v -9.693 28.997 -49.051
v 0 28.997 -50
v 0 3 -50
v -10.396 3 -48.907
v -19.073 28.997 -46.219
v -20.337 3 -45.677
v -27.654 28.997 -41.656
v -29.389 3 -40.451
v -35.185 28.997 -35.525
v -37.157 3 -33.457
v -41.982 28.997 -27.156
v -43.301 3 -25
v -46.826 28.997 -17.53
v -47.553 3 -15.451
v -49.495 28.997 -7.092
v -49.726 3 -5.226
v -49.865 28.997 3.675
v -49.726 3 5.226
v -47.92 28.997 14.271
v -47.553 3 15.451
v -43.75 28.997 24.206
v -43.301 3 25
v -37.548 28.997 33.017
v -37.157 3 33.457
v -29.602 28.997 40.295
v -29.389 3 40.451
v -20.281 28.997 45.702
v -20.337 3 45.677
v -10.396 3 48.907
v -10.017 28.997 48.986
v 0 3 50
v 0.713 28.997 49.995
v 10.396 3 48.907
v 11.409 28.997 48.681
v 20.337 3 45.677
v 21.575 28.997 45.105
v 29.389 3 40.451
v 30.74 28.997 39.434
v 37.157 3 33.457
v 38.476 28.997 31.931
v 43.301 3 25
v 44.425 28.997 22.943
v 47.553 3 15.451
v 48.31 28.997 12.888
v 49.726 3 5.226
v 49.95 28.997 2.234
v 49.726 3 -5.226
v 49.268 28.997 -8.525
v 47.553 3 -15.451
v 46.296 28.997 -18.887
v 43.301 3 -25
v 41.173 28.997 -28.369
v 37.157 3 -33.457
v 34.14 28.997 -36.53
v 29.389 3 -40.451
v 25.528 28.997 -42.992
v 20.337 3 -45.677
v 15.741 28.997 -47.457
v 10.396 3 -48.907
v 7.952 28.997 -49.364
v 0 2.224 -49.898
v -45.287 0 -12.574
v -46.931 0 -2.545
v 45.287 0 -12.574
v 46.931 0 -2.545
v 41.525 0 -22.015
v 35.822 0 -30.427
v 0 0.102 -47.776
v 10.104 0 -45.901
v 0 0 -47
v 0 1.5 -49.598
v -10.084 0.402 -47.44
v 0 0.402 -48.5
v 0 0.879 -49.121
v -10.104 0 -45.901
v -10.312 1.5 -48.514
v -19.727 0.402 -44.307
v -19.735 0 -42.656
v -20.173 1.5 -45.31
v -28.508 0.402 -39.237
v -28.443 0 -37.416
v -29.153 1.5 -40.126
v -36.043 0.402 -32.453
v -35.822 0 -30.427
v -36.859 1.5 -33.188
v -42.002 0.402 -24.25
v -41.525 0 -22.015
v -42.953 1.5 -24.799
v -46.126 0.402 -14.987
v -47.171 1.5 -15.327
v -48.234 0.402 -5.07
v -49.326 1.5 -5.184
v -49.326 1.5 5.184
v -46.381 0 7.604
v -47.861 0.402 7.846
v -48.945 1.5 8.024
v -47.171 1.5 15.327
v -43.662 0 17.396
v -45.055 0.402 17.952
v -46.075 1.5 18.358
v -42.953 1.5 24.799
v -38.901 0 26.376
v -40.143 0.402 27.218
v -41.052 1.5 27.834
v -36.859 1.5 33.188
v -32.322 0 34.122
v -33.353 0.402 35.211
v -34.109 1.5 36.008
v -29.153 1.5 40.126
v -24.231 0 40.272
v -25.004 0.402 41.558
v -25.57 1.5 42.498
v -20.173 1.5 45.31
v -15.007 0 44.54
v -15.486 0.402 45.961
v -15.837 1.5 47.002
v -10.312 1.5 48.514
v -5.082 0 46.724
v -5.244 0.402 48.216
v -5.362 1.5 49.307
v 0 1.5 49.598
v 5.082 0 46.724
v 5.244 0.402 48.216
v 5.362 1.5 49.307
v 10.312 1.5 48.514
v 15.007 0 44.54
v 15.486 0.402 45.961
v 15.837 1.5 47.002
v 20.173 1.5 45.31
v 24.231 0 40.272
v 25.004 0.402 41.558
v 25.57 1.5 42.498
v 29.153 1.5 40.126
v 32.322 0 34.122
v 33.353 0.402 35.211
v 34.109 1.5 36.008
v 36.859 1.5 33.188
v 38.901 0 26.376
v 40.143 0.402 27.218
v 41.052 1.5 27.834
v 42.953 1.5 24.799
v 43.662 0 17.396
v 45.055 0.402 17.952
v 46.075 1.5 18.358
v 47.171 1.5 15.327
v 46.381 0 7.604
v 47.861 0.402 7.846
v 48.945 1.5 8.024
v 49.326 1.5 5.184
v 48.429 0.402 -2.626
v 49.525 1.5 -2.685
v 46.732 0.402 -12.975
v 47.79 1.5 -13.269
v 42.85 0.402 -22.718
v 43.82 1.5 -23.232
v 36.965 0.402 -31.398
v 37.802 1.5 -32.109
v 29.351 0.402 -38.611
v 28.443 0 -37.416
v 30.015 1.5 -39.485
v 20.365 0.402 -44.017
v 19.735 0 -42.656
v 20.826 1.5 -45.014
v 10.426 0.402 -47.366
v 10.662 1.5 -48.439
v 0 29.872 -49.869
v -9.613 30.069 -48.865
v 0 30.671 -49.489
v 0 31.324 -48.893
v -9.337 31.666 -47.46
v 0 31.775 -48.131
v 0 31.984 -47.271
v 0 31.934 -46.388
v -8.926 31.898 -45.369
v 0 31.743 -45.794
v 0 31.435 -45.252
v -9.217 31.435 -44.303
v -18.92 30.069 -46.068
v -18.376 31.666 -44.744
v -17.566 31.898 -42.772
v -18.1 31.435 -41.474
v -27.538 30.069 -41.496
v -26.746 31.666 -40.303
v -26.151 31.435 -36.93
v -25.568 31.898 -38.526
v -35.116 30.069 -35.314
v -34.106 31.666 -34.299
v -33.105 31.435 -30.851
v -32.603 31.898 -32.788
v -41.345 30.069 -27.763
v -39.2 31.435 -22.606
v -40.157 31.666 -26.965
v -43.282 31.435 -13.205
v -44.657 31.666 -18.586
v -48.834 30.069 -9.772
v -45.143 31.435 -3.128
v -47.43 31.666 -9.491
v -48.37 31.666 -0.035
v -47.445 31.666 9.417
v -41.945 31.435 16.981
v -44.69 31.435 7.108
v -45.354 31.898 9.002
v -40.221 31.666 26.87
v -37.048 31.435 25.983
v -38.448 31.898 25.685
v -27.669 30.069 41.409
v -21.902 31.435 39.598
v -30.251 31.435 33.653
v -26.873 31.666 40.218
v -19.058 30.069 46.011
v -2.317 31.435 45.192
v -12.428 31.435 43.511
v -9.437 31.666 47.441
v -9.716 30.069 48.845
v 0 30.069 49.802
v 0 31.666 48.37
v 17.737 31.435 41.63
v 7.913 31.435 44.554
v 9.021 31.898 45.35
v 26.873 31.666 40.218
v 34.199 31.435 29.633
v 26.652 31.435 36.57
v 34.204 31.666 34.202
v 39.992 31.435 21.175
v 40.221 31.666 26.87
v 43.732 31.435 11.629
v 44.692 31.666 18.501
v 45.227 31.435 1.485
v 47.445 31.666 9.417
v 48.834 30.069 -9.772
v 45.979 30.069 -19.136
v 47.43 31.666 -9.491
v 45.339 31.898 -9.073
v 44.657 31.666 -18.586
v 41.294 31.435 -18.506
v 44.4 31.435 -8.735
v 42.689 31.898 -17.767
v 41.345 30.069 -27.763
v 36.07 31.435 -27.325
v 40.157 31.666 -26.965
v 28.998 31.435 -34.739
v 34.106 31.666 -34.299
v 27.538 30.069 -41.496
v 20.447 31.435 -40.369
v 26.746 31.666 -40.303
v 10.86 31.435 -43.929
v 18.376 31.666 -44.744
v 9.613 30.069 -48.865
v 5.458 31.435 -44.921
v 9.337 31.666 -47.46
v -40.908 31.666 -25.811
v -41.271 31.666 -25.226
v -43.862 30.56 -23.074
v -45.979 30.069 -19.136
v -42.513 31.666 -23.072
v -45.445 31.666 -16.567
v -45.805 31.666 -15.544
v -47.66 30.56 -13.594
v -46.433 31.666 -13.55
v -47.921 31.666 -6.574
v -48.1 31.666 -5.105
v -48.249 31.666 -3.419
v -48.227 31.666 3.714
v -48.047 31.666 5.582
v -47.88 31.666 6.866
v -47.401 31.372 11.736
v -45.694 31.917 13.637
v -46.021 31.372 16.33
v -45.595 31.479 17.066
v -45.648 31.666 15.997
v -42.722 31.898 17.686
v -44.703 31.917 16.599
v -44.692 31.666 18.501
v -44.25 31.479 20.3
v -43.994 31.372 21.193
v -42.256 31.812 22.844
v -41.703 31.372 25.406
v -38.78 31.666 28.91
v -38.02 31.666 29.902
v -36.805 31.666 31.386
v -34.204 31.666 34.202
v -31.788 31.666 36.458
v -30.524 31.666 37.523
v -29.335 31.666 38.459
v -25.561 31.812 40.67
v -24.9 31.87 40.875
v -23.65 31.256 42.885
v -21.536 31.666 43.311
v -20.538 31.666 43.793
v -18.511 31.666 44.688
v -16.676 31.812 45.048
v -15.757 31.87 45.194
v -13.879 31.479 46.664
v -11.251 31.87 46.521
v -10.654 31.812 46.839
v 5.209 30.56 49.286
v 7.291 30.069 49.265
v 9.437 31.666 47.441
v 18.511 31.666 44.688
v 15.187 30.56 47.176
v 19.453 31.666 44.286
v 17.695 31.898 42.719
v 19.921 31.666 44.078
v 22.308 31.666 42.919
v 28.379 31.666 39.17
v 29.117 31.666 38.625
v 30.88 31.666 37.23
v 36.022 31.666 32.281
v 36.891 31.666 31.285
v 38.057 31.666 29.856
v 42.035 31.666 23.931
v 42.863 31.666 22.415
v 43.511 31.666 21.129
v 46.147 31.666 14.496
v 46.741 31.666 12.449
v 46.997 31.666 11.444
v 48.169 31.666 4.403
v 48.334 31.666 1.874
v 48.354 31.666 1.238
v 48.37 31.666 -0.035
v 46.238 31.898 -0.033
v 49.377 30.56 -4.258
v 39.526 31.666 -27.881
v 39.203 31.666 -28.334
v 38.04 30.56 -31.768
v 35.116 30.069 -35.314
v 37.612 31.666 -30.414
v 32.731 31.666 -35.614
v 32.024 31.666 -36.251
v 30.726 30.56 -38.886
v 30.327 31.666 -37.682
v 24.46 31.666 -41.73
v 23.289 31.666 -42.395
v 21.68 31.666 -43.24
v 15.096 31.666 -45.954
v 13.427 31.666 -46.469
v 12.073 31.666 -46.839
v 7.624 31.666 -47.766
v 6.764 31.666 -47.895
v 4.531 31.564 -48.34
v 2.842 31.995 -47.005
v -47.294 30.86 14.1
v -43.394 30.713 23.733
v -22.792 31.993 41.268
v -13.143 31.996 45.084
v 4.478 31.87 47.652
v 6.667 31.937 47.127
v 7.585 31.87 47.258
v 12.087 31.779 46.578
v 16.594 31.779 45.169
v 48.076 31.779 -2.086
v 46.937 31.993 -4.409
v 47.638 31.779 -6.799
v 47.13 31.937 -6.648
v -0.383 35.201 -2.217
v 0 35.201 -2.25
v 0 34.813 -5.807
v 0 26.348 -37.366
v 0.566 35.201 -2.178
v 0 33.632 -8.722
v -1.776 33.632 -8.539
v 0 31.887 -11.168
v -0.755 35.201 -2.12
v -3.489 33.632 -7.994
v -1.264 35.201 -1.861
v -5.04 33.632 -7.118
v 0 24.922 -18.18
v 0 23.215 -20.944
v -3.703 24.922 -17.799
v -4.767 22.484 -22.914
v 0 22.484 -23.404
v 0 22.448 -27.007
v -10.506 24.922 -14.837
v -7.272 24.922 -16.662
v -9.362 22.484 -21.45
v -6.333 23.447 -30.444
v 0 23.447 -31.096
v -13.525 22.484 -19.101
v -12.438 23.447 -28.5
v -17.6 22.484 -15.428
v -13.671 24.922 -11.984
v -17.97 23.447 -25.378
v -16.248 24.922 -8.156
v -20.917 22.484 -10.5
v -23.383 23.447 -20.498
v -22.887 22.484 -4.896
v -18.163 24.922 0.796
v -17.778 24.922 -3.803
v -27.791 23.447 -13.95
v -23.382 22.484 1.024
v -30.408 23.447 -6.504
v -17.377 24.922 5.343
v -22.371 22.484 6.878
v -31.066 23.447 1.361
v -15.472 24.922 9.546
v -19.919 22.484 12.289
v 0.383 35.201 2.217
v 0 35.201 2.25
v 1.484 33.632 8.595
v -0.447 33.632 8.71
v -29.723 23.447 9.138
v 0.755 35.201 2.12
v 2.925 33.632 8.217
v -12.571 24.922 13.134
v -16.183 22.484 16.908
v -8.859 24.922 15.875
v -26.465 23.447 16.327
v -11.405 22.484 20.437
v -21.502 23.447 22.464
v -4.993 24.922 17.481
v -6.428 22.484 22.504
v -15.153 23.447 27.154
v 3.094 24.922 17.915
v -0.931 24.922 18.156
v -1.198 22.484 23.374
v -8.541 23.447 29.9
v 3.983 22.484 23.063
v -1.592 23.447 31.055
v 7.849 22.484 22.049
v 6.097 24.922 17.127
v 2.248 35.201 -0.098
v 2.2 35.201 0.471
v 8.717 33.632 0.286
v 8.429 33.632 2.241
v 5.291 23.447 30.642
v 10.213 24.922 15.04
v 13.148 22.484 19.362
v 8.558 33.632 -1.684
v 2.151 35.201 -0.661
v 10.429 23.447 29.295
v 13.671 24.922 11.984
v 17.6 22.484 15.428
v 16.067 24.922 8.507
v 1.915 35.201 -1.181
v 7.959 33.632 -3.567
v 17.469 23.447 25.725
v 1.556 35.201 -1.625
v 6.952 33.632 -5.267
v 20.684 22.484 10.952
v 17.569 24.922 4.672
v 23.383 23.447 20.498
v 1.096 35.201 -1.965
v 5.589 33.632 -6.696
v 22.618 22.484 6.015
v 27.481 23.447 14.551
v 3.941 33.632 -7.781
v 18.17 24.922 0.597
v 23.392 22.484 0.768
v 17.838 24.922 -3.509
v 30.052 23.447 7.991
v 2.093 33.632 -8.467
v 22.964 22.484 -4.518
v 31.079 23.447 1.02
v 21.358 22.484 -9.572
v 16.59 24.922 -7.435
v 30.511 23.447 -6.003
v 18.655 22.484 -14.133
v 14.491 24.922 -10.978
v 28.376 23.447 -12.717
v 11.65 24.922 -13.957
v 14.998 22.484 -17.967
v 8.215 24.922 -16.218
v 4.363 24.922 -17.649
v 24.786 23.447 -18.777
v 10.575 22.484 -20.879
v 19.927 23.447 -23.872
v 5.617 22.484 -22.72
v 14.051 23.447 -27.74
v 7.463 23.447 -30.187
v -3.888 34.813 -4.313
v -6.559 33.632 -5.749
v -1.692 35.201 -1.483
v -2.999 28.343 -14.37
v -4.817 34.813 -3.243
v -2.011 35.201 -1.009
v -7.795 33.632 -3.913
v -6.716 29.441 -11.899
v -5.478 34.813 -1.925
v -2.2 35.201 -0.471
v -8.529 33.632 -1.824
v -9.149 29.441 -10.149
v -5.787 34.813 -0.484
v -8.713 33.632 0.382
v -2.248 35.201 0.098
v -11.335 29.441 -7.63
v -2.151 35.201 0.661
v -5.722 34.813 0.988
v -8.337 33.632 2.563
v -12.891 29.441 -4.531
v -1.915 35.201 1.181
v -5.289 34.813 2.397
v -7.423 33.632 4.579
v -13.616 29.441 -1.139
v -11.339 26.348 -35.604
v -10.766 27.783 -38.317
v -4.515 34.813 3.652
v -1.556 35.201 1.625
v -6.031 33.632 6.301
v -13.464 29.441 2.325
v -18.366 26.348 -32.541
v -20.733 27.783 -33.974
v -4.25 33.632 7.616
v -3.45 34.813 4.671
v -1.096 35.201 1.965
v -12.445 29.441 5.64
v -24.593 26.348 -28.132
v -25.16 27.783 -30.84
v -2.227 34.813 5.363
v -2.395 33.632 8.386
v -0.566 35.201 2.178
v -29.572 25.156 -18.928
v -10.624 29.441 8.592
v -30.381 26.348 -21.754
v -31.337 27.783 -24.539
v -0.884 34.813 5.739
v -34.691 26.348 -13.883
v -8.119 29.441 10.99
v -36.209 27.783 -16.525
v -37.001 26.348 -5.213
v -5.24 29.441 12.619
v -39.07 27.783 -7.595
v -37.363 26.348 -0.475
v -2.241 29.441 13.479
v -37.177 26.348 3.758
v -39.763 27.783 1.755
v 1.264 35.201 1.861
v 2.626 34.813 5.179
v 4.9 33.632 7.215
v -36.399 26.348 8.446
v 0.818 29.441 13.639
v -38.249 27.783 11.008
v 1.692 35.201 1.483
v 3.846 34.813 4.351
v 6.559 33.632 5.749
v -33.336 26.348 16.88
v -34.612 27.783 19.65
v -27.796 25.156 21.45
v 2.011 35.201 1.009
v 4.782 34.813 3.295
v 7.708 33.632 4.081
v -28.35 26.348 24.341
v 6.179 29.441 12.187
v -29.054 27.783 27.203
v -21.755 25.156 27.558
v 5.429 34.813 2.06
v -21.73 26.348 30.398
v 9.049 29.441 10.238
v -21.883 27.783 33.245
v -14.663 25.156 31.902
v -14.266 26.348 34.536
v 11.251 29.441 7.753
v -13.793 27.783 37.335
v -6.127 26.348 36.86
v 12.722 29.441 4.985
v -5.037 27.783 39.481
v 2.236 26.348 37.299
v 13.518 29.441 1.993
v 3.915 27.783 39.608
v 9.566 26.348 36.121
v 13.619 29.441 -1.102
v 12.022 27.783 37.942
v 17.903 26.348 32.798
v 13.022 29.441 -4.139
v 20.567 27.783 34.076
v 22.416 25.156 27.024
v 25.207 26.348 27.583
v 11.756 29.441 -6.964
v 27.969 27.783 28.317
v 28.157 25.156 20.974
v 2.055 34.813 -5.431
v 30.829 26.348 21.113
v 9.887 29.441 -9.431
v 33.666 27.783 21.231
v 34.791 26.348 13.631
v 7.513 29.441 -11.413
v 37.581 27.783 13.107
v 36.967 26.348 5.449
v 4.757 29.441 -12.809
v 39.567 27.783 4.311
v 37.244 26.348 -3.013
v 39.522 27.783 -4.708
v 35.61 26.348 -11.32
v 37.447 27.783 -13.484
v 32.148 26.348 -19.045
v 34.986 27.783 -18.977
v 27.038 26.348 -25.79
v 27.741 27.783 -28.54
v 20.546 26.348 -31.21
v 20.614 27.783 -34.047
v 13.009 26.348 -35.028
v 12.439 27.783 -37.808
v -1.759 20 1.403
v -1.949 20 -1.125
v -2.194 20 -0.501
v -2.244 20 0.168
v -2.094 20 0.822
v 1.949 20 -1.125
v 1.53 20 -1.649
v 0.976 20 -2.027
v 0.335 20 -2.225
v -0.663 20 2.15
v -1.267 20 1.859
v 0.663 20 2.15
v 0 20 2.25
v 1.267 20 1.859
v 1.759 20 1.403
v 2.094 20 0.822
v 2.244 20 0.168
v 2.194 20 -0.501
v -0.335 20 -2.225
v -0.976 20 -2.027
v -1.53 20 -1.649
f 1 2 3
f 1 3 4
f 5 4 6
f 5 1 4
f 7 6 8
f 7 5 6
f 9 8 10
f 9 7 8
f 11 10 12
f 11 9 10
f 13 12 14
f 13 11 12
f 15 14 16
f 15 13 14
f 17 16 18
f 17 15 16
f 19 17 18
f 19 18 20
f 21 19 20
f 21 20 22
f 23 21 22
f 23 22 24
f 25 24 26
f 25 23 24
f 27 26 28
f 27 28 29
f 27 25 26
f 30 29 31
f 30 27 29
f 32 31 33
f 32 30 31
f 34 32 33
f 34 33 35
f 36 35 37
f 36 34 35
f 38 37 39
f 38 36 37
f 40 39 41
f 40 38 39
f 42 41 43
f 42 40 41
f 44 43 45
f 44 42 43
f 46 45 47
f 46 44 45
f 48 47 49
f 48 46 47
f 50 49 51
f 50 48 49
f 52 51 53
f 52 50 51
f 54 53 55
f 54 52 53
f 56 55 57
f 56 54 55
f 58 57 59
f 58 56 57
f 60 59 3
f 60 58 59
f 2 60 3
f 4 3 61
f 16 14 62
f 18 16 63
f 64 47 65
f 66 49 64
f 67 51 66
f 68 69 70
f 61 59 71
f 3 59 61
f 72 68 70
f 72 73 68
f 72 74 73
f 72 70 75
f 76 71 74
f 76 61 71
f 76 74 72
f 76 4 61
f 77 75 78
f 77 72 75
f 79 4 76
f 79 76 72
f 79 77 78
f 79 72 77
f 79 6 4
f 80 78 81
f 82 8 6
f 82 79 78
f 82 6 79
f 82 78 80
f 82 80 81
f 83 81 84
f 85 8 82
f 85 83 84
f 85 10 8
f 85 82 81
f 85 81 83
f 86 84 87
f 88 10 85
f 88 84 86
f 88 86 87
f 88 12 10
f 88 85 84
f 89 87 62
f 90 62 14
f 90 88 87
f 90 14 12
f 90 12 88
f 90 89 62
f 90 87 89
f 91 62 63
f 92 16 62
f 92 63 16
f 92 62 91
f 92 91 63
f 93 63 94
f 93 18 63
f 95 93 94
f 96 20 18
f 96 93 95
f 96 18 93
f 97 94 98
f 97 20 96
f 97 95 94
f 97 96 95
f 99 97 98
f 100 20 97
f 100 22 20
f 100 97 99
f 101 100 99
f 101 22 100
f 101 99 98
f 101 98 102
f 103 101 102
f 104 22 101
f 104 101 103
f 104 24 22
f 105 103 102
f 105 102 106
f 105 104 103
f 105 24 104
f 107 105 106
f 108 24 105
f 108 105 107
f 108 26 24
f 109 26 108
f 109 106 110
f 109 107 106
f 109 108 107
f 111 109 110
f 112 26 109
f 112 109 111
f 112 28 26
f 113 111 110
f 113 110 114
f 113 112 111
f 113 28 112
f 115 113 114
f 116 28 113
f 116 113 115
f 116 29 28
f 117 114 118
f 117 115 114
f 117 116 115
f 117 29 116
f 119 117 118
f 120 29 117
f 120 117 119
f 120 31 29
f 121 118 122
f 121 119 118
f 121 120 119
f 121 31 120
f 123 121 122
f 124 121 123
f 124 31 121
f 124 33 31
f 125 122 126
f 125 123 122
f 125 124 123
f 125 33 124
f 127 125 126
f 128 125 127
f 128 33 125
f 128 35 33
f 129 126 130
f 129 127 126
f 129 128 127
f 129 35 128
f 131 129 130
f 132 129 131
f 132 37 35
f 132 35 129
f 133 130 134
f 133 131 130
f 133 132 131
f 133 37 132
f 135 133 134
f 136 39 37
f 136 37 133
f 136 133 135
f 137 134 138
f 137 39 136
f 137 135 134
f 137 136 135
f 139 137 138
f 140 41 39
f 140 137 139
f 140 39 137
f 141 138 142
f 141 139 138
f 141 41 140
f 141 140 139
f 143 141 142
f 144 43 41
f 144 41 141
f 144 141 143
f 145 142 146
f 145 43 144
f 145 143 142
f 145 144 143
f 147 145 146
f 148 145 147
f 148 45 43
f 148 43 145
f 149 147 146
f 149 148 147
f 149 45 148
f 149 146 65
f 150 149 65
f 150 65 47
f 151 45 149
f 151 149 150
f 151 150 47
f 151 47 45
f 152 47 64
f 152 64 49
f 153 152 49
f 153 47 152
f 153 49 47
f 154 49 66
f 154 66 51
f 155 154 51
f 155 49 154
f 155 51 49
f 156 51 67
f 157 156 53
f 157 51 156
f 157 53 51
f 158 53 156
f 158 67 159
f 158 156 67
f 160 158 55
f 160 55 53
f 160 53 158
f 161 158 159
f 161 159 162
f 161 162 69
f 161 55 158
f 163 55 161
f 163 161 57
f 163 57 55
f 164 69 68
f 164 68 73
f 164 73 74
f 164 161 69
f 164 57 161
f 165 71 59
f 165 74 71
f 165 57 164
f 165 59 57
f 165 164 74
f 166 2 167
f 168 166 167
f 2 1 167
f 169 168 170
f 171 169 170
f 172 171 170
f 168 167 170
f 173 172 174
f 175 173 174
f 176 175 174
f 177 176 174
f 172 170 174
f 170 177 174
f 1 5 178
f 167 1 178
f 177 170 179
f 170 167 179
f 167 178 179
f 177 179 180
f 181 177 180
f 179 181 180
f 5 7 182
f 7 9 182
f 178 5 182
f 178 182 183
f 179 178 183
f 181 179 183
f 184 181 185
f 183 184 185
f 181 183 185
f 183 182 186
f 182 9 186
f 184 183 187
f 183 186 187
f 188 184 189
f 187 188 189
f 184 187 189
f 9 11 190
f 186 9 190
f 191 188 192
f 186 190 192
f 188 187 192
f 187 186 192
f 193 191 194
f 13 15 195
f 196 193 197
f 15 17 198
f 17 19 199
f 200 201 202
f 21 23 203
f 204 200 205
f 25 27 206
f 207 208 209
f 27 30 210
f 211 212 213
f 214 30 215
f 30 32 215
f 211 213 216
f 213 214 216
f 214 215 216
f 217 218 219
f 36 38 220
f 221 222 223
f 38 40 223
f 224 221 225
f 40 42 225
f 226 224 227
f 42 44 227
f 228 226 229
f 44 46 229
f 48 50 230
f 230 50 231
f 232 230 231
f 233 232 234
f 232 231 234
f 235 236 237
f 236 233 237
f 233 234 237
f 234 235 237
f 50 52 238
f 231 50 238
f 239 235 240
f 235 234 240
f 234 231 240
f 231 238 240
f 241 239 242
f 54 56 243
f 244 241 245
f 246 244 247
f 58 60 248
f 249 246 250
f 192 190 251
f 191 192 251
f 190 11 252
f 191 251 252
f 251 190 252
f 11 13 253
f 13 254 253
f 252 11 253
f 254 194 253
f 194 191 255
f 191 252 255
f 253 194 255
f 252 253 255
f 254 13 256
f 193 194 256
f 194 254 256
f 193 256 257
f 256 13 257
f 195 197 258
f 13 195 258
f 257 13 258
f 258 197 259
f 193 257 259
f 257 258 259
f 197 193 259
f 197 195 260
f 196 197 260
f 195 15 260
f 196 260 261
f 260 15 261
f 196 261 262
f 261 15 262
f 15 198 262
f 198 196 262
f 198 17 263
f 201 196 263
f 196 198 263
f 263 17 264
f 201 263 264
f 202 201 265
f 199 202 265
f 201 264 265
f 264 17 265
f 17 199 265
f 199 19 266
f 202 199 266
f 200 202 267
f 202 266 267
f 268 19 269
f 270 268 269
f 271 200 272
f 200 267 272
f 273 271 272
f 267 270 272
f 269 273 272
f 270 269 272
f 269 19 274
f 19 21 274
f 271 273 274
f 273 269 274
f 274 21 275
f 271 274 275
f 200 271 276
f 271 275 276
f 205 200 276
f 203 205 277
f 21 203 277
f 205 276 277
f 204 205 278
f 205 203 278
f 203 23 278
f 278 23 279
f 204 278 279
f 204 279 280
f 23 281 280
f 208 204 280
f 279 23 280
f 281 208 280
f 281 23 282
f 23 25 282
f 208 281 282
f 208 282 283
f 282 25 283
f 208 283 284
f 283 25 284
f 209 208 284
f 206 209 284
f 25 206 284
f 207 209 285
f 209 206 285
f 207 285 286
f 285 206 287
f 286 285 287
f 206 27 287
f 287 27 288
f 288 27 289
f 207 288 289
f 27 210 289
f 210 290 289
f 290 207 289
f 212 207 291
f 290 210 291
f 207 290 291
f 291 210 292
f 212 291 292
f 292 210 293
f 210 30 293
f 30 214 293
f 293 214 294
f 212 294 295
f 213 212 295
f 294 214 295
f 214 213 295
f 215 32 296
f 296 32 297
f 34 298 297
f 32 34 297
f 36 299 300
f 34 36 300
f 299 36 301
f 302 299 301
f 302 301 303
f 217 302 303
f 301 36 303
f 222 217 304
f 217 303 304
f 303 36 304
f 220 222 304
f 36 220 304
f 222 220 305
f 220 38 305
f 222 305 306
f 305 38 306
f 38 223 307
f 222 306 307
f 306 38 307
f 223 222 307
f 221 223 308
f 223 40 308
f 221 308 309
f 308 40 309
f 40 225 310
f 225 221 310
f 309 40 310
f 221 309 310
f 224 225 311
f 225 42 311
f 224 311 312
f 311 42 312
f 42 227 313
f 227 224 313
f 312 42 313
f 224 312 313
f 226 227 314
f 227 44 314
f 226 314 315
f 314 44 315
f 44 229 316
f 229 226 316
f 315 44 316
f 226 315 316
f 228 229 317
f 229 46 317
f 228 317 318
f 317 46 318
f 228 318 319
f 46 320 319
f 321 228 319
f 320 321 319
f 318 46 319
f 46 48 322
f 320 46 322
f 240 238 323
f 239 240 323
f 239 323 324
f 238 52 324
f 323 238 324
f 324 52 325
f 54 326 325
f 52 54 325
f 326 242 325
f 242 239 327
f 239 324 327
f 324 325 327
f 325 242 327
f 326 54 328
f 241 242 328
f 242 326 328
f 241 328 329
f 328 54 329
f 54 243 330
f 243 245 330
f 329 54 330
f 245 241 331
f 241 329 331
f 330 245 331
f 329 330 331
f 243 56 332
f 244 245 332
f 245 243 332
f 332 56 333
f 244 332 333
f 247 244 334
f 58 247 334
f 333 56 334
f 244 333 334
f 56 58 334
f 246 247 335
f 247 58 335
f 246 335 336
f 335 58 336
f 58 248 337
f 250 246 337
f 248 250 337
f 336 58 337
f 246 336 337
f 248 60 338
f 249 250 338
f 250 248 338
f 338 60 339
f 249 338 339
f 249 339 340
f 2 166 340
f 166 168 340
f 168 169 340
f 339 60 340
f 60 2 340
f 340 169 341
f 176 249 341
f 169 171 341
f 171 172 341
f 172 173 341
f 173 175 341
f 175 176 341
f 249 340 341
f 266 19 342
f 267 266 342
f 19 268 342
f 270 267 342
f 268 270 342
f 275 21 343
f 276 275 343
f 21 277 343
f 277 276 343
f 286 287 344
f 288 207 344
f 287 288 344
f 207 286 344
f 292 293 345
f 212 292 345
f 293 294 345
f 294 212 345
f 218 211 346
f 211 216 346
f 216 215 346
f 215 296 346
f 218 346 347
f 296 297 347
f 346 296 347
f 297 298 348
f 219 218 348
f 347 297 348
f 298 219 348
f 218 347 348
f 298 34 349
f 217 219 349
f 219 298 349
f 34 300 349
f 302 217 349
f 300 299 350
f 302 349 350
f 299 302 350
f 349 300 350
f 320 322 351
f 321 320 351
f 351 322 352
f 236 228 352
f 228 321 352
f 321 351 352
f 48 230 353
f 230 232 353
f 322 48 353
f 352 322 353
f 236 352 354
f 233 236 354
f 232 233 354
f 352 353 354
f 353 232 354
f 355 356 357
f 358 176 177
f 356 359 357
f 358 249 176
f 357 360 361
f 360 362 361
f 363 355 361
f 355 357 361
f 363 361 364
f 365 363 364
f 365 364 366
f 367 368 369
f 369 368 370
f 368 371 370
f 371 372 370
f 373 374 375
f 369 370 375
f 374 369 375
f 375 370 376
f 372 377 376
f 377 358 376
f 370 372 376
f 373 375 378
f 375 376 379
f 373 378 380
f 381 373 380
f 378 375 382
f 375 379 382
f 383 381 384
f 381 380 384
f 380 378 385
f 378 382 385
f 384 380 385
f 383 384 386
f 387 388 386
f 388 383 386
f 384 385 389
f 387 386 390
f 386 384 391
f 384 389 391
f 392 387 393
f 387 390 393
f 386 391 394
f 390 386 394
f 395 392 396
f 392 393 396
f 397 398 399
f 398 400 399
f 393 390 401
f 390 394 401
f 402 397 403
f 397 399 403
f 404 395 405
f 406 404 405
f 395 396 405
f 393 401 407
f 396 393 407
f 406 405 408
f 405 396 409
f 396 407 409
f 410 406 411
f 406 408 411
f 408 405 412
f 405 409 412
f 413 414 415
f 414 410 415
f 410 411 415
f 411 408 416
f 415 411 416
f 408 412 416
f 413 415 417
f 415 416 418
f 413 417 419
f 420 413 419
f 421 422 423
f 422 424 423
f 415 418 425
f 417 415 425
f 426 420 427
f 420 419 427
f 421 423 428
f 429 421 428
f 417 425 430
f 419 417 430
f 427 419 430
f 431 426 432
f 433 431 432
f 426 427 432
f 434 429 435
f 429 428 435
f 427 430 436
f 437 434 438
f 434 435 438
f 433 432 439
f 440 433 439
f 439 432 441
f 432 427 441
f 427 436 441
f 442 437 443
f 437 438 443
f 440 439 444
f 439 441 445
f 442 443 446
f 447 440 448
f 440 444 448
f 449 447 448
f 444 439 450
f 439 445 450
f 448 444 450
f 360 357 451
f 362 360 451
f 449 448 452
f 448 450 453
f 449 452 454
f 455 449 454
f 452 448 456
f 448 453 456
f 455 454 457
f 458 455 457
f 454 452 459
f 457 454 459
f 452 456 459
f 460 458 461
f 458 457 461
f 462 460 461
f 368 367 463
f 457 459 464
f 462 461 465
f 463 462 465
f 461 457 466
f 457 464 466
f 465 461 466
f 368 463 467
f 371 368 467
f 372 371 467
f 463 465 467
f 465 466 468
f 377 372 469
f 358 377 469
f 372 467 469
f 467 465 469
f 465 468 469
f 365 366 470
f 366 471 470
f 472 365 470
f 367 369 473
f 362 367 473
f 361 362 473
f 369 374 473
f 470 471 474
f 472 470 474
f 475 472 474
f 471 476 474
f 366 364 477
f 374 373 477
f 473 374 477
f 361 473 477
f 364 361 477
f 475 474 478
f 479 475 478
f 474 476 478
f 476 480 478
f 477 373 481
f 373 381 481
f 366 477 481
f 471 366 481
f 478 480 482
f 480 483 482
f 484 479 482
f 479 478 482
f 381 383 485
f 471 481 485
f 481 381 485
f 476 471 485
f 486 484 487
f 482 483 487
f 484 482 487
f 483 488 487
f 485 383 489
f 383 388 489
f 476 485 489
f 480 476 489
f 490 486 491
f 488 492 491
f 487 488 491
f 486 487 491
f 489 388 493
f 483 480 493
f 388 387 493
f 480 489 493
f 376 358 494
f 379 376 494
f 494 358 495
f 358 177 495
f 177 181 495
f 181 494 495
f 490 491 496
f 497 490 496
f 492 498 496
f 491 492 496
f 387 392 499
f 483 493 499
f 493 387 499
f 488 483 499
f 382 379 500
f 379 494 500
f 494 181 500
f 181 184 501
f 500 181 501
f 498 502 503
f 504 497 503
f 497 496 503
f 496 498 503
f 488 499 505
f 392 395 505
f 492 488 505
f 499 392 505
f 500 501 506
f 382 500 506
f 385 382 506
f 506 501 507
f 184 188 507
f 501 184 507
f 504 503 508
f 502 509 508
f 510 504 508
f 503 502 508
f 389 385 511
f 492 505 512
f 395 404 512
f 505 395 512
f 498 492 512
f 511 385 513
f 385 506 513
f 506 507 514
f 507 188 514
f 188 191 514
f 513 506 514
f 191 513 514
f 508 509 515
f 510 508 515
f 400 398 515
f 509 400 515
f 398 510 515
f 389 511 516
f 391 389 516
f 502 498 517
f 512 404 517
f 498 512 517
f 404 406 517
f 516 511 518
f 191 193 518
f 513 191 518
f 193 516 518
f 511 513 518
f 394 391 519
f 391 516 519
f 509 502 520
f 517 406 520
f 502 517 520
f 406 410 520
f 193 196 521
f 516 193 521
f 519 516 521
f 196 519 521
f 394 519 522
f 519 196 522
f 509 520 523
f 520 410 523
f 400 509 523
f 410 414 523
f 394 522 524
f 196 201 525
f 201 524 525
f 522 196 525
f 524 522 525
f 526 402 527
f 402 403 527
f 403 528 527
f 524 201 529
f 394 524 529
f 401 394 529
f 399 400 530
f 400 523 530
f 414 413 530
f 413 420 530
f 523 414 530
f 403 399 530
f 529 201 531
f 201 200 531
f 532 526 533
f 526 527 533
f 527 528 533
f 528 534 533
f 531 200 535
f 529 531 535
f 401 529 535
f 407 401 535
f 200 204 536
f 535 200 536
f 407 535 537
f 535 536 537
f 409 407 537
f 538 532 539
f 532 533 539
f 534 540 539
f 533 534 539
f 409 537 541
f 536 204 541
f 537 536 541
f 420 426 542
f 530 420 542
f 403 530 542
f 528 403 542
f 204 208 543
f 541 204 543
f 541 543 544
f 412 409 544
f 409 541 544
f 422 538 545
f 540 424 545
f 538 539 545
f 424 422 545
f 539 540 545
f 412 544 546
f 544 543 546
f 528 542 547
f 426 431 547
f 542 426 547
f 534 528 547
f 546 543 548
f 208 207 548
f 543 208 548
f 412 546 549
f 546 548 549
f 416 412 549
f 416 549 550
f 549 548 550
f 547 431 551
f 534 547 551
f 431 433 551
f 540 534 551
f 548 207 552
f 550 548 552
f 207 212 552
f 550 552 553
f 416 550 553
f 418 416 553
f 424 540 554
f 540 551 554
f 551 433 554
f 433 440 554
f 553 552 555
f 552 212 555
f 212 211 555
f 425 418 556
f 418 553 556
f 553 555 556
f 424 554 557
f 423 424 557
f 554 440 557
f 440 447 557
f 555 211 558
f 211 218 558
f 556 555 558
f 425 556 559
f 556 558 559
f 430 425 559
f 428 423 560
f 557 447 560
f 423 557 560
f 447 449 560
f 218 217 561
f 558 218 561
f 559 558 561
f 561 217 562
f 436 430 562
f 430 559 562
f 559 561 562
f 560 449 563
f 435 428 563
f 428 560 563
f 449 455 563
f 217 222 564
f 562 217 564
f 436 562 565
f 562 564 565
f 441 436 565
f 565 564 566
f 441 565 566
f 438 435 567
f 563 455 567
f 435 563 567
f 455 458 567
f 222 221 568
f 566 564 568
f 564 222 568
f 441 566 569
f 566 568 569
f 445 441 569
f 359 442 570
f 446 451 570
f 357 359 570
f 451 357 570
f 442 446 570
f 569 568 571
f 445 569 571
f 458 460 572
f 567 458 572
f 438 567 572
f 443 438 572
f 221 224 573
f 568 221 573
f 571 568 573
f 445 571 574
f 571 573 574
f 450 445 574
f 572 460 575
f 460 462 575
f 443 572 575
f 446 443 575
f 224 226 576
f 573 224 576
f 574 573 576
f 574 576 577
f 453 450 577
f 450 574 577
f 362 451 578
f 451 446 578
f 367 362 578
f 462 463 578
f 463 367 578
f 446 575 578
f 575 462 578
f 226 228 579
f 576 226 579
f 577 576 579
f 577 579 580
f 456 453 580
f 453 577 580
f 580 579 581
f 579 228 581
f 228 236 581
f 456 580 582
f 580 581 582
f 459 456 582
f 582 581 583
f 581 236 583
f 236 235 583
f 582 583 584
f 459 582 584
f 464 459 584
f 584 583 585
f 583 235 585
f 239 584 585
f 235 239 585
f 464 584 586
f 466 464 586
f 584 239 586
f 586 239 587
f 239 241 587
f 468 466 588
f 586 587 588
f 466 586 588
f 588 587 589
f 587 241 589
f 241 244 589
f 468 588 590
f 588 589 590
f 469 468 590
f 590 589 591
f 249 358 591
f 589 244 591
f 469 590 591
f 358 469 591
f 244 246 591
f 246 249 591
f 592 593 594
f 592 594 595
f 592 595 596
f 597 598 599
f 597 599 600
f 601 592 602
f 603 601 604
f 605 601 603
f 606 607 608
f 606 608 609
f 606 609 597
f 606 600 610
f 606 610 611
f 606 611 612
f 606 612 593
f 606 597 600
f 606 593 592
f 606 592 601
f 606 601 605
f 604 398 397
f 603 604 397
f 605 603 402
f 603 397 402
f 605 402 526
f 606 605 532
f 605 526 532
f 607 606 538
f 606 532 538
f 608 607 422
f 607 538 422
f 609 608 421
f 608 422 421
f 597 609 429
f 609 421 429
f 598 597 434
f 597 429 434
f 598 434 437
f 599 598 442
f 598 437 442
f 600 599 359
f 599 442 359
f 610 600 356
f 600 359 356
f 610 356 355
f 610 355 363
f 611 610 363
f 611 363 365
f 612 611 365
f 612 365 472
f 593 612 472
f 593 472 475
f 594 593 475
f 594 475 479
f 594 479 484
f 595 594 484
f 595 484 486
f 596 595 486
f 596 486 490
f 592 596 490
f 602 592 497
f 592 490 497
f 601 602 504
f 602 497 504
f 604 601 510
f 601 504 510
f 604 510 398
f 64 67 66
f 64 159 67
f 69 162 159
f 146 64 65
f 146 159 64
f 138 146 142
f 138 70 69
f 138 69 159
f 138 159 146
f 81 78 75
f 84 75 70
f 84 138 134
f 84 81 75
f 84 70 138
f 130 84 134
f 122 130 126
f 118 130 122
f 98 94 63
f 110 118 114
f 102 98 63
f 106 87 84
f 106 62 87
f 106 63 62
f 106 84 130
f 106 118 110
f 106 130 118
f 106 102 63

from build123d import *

# Parameters (mm, degrees)
FILLET1_R          = 3
SKETCH2_R          = 2.25
CUT_EXTRUDE1_DEPTH = 30


with BuildPart() as part:
    # Sketch1 → Revolve1 (revolve)
    with BuildSketch(Plane.XY, mode=Mode.PRIVATE) as revolve1_sk:
        with BuildLine():
            Line((0, 0), (50, 0))
            Line((50, 0), (50, 35))
            add(Edge.make_bspline(
                [(0, 35), (20.190635026, 38.073649128), (11.656369597, 5.024124106), (50, 35)],
                knots=[0, 0, 0, 0, 1, 1, 1, 1], degree=3))
            Line((0, 35), (0, 0))
        make_face()
    revolve(revolve1_sk.sketch.rotate(Axis((0, 0, 0), (0, 1, 0)), 90), axis=Axis((0, 0, 0), (0, 1, 0)))

    # Fillet1
    fillet1_edges = [part.edges().sort_by_distance(p)[0] for p in [
        (0, 35, 50),
        (0, 0, 50),
    ]]
    fillet(fillet1_edges, radius=FILLET1_R)

    # Sketch2 → Cut-Extrude1 (cut)
    with BuildSketch(Plane(origin=(0, 50, 0), x_dir=(1, 0, 0), z_dir=(0, 1, 0))):
        with Locations(Location((0, 0, 0), (0, 0, 270))):
            Circle(SKETCH2_R)
    extrude(amount=-CUT_EXTRUDE1_DEPTH, mode=Mode.SUBTRACT)


solid = part.part
